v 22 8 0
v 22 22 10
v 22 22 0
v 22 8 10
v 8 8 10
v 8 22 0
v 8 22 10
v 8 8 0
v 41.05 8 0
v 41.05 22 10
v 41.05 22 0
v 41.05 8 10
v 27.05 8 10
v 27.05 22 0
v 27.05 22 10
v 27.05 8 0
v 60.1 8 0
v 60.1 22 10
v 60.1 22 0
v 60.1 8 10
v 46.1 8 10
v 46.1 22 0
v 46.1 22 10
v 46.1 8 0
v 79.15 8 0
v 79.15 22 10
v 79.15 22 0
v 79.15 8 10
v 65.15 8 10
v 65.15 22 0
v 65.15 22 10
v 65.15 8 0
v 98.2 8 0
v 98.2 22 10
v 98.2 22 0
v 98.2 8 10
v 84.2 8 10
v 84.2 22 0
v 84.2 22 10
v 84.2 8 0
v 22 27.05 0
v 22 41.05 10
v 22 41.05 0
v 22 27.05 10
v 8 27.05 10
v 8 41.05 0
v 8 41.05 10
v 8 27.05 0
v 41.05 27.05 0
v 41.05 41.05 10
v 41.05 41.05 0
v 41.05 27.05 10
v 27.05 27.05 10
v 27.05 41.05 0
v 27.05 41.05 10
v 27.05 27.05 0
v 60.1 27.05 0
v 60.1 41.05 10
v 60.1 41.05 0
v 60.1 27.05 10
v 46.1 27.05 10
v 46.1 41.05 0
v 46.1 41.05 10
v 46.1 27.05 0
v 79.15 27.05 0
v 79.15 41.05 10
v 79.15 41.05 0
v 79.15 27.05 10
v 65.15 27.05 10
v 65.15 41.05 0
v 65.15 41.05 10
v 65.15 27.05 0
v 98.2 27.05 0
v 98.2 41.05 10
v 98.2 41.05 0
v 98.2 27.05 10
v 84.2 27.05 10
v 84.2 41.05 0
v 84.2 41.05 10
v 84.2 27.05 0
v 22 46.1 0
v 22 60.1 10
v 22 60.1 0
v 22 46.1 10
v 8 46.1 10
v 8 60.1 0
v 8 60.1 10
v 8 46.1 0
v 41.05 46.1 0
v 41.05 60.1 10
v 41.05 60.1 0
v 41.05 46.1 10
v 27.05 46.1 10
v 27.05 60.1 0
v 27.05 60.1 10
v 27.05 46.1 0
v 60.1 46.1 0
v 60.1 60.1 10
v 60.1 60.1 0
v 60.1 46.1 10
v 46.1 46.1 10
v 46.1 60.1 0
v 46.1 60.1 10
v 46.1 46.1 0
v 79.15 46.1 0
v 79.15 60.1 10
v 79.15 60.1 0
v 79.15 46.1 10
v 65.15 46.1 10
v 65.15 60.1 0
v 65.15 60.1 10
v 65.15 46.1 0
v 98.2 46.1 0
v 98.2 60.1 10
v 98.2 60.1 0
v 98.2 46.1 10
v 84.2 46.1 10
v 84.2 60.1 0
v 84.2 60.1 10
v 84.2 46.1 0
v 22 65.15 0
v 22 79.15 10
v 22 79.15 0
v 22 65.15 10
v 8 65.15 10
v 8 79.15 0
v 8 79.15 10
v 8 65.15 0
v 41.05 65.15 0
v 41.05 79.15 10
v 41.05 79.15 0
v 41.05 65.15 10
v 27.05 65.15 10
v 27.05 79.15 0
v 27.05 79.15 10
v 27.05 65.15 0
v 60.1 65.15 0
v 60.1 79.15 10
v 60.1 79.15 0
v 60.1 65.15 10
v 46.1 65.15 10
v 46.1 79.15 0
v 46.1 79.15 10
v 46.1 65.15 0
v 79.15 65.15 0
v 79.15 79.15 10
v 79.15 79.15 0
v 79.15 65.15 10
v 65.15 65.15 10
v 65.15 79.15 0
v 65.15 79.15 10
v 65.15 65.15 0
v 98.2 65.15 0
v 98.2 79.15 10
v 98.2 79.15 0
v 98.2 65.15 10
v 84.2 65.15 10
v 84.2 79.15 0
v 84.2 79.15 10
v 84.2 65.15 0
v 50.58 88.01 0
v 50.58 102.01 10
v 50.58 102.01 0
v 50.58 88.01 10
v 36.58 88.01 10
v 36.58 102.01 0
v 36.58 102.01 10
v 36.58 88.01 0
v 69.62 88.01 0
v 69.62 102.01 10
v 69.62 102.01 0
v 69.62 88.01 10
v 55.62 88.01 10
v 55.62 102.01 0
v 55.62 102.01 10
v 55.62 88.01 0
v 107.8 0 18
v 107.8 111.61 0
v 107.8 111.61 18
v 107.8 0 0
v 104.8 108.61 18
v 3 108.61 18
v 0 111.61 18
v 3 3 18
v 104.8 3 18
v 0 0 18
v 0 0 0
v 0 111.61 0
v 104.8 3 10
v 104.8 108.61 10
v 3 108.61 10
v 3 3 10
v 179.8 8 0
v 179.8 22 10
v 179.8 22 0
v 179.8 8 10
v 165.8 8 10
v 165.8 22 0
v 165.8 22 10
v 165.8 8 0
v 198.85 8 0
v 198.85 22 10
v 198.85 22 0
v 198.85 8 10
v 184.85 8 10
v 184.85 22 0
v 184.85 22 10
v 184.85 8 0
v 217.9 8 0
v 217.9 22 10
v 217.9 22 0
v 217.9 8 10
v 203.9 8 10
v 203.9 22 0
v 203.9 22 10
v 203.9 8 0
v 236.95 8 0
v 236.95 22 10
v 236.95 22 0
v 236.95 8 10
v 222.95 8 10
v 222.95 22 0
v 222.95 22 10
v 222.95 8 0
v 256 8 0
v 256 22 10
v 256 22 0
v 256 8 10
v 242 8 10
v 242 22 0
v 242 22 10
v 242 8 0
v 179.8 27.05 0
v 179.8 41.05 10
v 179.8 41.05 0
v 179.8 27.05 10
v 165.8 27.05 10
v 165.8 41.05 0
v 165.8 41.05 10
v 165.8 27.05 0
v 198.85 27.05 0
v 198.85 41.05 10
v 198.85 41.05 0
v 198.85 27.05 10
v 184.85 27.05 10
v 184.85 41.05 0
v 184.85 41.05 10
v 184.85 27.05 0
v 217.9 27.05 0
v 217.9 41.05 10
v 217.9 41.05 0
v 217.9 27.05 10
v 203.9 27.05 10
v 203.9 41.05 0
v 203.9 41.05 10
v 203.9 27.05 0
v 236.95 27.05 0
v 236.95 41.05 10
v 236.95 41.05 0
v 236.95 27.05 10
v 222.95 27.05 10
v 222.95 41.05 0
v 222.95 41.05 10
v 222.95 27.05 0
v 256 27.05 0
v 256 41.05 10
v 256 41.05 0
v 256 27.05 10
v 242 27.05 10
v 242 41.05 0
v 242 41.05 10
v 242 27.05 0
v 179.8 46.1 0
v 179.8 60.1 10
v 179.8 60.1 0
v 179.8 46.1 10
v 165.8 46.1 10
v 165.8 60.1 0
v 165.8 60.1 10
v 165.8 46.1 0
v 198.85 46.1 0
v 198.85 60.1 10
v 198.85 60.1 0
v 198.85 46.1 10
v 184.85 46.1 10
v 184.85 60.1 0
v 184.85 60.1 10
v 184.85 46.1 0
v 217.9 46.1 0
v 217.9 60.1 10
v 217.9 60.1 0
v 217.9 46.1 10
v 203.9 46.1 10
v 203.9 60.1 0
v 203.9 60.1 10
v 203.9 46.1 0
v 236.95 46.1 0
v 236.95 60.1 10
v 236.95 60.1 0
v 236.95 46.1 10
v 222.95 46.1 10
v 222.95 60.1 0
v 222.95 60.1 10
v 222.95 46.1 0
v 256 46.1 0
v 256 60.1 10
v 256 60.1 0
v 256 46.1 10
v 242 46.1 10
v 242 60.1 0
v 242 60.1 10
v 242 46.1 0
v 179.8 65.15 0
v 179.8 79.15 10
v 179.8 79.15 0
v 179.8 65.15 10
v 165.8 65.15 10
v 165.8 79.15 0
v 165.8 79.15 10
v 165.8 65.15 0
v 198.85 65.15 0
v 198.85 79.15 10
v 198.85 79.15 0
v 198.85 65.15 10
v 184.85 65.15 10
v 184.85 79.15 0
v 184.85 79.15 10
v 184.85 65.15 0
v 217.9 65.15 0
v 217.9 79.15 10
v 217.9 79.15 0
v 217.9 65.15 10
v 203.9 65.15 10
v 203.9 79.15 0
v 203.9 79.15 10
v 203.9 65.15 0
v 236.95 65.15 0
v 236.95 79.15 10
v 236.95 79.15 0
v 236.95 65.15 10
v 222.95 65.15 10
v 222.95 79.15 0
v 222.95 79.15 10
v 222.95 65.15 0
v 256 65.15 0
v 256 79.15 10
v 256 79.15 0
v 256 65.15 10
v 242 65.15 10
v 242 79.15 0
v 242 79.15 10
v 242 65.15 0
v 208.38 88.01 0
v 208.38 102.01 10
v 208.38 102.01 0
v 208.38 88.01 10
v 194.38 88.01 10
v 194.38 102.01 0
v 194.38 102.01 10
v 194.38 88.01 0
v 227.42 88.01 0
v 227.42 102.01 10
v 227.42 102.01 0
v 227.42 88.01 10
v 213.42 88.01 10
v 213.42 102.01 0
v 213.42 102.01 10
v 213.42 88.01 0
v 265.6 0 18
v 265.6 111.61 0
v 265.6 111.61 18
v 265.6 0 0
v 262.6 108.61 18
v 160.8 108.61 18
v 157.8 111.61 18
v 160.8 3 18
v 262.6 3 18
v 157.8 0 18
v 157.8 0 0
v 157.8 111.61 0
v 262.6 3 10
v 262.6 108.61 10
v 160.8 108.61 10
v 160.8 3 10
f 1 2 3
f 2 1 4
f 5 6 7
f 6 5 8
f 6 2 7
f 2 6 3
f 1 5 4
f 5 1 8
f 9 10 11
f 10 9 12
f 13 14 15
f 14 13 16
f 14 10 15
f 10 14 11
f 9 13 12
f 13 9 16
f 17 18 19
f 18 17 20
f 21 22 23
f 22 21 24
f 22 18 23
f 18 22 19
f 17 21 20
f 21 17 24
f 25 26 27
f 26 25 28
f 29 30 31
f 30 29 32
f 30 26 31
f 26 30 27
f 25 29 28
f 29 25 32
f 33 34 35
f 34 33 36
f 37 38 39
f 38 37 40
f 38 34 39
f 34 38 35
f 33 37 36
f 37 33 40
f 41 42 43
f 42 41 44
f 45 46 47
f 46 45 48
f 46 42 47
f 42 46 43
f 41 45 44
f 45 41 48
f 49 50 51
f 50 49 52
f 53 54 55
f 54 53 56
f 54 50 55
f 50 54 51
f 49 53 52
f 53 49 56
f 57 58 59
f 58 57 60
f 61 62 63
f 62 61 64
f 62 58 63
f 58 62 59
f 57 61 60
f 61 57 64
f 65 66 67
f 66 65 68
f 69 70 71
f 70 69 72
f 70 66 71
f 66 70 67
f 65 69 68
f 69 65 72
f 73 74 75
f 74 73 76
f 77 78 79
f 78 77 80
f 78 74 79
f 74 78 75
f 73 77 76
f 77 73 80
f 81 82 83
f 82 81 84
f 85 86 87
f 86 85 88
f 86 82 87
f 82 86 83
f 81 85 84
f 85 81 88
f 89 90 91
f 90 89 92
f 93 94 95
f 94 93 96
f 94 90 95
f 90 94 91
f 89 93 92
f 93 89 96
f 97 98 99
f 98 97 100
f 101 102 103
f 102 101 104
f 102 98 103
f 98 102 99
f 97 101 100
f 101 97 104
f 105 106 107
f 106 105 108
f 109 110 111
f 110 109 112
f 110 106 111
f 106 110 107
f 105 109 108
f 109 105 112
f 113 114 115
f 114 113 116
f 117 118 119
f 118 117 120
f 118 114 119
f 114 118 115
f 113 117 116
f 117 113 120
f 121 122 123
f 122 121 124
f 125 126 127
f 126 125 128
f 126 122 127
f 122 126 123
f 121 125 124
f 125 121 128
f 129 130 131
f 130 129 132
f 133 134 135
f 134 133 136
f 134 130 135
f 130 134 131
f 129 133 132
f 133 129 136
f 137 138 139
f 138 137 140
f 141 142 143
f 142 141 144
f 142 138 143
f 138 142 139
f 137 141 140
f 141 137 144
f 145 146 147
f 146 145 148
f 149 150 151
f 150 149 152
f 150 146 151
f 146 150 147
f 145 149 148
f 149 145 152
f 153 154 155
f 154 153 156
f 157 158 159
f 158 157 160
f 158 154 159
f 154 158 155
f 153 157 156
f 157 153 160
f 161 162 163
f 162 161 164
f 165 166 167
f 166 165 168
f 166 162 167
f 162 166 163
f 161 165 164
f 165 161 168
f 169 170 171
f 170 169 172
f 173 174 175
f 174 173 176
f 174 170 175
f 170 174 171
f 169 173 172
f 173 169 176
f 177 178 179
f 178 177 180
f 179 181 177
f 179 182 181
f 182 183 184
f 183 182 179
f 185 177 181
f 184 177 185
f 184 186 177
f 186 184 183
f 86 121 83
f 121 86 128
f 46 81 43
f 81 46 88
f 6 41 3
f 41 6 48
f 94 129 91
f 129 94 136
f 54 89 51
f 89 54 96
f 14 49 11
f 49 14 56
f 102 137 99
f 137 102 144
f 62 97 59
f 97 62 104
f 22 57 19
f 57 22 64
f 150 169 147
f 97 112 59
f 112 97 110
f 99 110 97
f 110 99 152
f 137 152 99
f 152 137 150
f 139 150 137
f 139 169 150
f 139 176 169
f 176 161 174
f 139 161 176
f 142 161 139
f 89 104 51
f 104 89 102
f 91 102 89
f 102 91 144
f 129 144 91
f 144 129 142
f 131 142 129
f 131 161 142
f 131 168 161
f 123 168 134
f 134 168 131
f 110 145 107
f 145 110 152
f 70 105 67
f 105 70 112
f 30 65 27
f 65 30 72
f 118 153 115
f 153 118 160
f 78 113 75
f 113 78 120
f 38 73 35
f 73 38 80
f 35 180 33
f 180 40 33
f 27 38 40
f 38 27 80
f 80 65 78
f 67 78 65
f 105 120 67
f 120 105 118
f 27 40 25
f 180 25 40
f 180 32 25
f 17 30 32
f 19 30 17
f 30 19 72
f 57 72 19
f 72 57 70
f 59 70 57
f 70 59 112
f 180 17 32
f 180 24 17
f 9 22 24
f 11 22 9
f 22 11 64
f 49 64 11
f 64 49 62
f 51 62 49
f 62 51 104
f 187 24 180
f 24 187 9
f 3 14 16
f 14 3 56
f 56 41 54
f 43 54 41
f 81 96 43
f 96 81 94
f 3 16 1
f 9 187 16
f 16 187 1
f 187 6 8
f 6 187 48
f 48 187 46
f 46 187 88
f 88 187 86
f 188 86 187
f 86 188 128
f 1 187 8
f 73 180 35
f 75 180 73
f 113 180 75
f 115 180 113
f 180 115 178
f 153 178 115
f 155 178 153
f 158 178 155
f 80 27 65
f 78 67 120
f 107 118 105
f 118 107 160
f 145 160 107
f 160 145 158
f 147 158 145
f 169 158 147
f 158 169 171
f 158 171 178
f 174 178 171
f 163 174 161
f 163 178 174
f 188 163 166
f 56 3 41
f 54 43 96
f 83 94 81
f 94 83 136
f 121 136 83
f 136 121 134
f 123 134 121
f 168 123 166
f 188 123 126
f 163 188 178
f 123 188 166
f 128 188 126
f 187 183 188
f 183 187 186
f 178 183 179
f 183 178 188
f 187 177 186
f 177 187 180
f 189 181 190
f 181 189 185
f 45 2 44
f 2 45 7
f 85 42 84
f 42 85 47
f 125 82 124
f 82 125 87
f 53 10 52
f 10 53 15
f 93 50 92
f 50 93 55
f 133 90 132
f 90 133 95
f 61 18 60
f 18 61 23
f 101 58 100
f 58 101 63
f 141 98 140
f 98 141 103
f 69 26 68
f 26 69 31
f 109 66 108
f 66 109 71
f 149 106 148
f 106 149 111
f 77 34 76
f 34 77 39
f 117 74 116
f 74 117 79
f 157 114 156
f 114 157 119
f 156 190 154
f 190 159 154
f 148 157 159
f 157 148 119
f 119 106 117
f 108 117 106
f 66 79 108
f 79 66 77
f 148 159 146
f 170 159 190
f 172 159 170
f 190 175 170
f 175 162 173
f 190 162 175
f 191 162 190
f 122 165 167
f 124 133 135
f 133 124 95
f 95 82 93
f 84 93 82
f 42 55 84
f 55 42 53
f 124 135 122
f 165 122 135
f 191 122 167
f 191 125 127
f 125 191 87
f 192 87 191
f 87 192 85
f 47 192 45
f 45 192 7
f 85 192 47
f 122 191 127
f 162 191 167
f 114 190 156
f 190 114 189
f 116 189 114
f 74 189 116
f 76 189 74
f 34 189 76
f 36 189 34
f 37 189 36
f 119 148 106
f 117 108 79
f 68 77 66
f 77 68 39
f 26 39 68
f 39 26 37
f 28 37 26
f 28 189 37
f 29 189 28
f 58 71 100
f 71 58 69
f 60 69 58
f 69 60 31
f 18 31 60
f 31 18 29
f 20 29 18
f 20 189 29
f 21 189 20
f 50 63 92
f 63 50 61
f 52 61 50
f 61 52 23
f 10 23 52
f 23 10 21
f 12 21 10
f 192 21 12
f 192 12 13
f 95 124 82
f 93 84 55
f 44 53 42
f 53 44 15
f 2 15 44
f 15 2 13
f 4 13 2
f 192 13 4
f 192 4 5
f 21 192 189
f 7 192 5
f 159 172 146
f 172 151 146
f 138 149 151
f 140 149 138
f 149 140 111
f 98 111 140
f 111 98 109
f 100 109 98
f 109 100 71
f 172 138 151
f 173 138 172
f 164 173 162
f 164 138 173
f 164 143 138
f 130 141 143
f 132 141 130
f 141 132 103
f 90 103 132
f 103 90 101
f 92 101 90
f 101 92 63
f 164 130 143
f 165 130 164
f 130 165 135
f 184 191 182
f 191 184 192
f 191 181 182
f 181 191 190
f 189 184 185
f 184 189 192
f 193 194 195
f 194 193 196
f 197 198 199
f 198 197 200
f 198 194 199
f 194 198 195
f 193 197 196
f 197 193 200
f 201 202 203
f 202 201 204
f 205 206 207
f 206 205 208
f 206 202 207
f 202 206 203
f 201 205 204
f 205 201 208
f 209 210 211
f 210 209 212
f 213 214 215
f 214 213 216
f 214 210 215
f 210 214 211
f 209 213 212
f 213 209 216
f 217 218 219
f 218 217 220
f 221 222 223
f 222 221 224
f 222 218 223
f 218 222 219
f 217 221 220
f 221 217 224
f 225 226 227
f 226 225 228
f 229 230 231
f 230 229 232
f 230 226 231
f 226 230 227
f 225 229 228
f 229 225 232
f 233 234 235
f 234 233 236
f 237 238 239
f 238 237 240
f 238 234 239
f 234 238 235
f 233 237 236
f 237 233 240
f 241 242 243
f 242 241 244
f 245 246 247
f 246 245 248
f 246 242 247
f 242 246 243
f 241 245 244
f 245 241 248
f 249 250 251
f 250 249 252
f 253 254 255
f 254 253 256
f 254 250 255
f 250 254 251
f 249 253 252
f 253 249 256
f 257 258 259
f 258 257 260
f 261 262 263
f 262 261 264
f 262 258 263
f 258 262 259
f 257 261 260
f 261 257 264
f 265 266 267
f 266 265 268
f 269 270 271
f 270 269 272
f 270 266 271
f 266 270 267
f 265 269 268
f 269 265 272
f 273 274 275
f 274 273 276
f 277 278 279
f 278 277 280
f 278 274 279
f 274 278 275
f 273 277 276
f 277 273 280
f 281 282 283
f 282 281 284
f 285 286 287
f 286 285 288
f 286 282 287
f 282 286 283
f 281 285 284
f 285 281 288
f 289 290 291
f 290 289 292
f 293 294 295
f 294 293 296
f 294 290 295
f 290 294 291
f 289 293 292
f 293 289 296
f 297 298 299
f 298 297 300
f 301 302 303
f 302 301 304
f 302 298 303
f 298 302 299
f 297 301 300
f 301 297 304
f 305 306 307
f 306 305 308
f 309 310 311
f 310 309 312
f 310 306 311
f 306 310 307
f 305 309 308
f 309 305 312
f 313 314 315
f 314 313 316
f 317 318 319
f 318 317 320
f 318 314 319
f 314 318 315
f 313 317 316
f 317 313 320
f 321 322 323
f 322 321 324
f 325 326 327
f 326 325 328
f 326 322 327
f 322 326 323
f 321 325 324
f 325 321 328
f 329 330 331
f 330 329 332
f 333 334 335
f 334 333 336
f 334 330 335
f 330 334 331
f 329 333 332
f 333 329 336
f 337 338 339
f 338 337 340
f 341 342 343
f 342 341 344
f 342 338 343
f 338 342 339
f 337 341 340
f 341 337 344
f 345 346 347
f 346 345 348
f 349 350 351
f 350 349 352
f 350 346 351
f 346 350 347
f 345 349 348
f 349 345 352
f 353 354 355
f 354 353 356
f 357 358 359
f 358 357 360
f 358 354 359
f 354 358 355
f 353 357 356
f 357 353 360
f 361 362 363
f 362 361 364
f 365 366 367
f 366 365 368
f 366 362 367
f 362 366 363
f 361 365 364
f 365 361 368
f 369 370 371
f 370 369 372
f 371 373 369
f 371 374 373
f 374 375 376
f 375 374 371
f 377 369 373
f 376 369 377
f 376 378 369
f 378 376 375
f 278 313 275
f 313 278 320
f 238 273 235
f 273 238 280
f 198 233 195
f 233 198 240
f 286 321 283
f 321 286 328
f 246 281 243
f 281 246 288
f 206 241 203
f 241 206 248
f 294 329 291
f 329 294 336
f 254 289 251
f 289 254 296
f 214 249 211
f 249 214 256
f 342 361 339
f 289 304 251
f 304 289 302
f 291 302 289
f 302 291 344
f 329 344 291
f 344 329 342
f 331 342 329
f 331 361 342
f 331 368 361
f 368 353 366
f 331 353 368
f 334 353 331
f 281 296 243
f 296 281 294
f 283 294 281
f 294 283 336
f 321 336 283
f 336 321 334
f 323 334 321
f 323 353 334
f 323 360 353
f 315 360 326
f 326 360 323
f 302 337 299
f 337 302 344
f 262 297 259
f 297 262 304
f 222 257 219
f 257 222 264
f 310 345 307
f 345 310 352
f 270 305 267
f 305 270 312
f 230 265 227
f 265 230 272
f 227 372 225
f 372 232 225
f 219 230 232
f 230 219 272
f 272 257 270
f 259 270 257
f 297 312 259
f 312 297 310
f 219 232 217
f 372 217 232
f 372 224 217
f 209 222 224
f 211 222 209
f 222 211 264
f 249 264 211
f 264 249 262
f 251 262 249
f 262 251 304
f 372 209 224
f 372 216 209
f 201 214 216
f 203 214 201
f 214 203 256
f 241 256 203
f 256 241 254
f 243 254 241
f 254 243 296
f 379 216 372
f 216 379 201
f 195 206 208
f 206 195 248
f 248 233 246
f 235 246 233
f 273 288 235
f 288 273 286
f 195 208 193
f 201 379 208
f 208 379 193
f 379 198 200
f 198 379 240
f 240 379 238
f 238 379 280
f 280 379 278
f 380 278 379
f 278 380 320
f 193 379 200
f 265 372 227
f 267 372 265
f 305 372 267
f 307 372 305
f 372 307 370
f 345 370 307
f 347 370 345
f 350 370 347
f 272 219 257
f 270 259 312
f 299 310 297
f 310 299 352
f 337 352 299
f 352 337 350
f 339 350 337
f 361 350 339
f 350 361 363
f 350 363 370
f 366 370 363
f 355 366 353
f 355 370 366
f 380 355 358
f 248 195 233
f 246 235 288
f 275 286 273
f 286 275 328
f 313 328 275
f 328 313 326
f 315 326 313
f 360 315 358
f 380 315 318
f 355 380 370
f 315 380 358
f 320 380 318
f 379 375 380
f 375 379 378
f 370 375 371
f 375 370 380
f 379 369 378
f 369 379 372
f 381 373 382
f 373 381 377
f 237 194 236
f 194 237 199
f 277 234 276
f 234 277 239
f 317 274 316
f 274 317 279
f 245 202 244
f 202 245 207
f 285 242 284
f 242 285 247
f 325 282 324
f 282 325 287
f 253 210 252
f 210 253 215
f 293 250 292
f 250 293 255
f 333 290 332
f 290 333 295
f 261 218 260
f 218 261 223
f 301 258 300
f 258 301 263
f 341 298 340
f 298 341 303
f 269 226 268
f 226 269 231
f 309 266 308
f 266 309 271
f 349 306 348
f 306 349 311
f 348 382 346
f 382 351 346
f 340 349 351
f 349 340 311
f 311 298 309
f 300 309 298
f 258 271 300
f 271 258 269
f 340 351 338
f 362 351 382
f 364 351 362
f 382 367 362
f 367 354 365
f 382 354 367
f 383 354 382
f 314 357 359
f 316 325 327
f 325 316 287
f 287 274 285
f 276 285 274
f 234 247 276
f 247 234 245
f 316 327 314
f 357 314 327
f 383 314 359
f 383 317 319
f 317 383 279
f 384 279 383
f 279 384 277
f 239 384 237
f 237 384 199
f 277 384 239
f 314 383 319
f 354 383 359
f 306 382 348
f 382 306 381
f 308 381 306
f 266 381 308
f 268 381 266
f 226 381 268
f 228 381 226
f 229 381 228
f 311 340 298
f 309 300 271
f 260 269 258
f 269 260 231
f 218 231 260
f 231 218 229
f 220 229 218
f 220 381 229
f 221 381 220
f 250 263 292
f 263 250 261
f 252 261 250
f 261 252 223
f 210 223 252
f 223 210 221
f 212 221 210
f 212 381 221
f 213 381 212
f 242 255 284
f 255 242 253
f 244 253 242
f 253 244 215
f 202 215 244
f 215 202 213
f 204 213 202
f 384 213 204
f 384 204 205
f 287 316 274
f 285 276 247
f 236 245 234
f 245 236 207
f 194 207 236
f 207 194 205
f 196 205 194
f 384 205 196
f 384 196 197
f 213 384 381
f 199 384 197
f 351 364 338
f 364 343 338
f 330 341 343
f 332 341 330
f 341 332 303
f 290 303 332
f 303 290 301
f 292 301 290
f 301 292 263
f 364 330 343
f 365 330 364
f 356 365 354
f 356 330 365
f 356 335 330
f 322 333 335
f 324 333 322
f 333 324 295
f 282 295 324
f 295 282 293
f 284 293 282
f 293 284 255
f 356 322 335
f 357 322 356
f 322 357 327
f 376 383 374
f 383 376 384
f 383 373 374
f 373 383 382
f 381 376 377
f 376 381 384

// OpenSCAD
// Generated keyboard case - Separate halves
// Layout: Custom (44 keys total)
// Switch type: Cherry MX
// Split keyboard: separate halves
// Optimization: render

// Parameters
left_case_width = 107.80;
left_case_height = 111.61;
right_case_width = 107.80;
right_case_height = 111.61;
case_depth = 18.00;
wall_thickness = 3.00;
base_height = 10.00;
switch_cutout_size = 14.00;
separation = 50;  // Distance between halves for visualization

module left_half() {
    difference() {
        // Outer shell
        cube([left_case_width, left_case_height, case_depth]);

        // Inner cavity
        translate([wall_thickness, wall_thickness, base_height])
            cube([left_case_width - 2*wall_thickness, 
                  left_case_height - 2*wall_thickness, 
                  case_depth - base_height + 1]);

        // Switch cutouts
        translate([wall_thickness + 5 - 0.00, wall_thickness + 5 - 0.00, -1])
            render() left_switch_plate();
    }
}

module right_half() {
    difference() {
        // Outer shell
        cube([right_case_width, right_case_height, case_depth]);

        // Inner cavity
        translate([wall_thickness, wall_thickness, base_height])
            cube([right_case_width - 2*wall_thickness, 
                  right_case_height - 2*wall_thickness, 
                  case_depth - base_height + 1]);

        // Switch cutouts
        translate([wall_thickness + 5 - 0.00, wall_thickness + 5 - 0.00, -1])
            render() right_switch_plate();
    }
}

module left_switch_plate() {
    translate([0.00, 0.00, 0])
        cube([switch_cutout_size, switch_cutout_size, base_height + 2]);
    translate([19.05, 0.00, 0])
        cube([switch_cutout_size, switch_cutout_size, base_height + 2]);
    translate([38.10, 0.00, 0])
        cube([switch_cutout_size, switch_cutout_size, base_height + 2]);
    translate([57.15, 0.00, 0])
        cube([switch_cutout_size, switch_cutout_size, base_height + 2]);
    translate([76.20, 0.00, 0])
        cube([switch_cutout_size, switch_cutout_size, base_height + 2]);
    translate([0.00, 19.05, 0])
        cube([switch_cutout_size, switch_cutout_size, base_height + 2]);
    translate([19.05, 19.05, 0])
        cube([switch_cutout_size, switch_cutout_size, base_height + 2]);
    translate([38.10, 19.05, 0])
        cube([switch_cutout_size, switch_cutout_size, base_height + 2]);
    translate([57.15, 19.05, 0])
        cube([switch_cutout_size, switch_cutout_size, base_height + 2]);
    translate([76.20, 19.05, 0])
        cube([switch_cutout_size, switch_cutout_size, base_height + 2]);
    translate([0.00, 38.10, 0])
        cube([switch_cutout_size, switch_cutout_size, base_height + 2]);
    translate([19.05, 38.10, 0])
        cube([switch_cutout_size, switch_cutout_size, base_height + 2]);
    translate([38.10, 38.10, 0])
        cube([switch_cutout_size, switch_cutout_size, base_height + 2]);
    translate([57.15, 38.10, 0])
        cube([switch_cutout_size, switch_cutout_size, base_height + 2]);
    translate([76.20, 38.10, 0])
        cube([switch_cutout_size, switch_cutout_size, base_height + 2]);
    translate([0.00, 57.15, 0])
        cube([switch_cutout_size, switch_cutout_size, base_height + 2]);
    translate([19.05, 57.15, 0])
        cube([switch_cutout_size, switch_cutout_size, base_height + 2]);
    translate([38.10, 57.15, 0])
        cube([switch_cutout_size, switch_cutout_size, base_height + 2]);
    translate([57.15, 57.15, 0])
        cube([switch_cutout_size, switch_cutout_size, base_height + 2]);
    translate([76.20, 57.15, 0])
        cube([switch_cutout_size, switch_cutout_size, base_height + 2]);
    translate([28.58, 80.01, 0])
        cube([switch_cutout_size, switch_cutout_size, base_height + 2]);
    translate([47.62, 80.01, 0])
        cube([switch_cutout_size, switch_cutout_size, base_height + 2]);
}

module right_switch_plate() {
    translate([0.00, 0.00, 0])
        cube([switch_cutout_size, switch_cutout_size, base_height + 2]);
    translate([19.05, 0.00, 0])
        cube([switch_cutout_size, switch_cutout_size, base_height + 2]);
    translate([38.10, 0.00, 0])
        cube([switch_cutout_size, switch_cutout_size, base_height + 2]);
    translate([57.15, 0.00, 0])
        cube([switch_cutout_size, switch_cutout_size, base_height + 2]);
    translate([76.20, 0.00, 0])
        cube([switch_cutout_size, switch_cutout_size, base_height + 2]);
    translate([0.00, 19.05, 0])
        cube([switch_cutout_size, switch_cutout_size, base_height + 2]);
    translate([19.05, 19.05, 0])
        cube([switch_cutout_size, switch_cutout_size, base_height + 2]);
    translate([38.10, 19.05, 0])
        cube([switch_cutout_size, switch_cutout_size, base_height + 2]);
    translate([57.15, 19.05, 0])
        cube([switch_cutout_size, switch_cutout_size, base_height + 2]);
    translate([76.20, 19.05, 0])
        cube([switch_cutout_size, switch_cutout_size, base_height + 2]);
    translate([0.00, 38.10, 0])
        cube([switch_cutout_size, switch_cutout_size, base_height + 2]);
    translate([19.05, 38.10, 0])
        cube([switch_cutout_size, switch_cutout_size, base_height + 2]);
    translate([38.10, 38.10, 0])
        cube([switch_cutout_size, switch_cutout_size, base_height + 2]);
    translate([57.15, 38.10, 0])
        cube([switch_cutout_size, switch_cutout_size, base_height + 2]);
    translate([76.20, 38.10, 0])
        cube([switch_cutout_size, switch_cutout_size, base_height + 2]);
    translate([0.00, 57.15, 0])
        cube([switch_cutout_size, switch_cutout_size, base_height + 2]);
    translate([19.05, 57.15, 0])
        cube([switch_cutout_size, switch_cutout_size, base_height + 2]);
    translate([38.10, 57.15, 0])
        cube([switch_cutout_size, switch_cutout_size, base_height + 2]);
    translate([57.15, 57.15, 0])
        cube([switch_cutout_size, switch_cutout_size, base_height + 2]);
    translate([76.20, 57.15, 0])
        cube([switch_cutout_size, switch_cutout_size, base_height + 2]);
    translate([28.58, 80.01, 0])
        cube([switch_cutout_size, switch_cutout_size, base_height + 2]);
    translate([47.62, 80.01, 0])
        cube([switch_cutout_size, switch_cutout_size, base_height + 2]);
}

// Generate both halves
left_half();
translate([left_case_width + separation, 0, 0])
    right_half();
